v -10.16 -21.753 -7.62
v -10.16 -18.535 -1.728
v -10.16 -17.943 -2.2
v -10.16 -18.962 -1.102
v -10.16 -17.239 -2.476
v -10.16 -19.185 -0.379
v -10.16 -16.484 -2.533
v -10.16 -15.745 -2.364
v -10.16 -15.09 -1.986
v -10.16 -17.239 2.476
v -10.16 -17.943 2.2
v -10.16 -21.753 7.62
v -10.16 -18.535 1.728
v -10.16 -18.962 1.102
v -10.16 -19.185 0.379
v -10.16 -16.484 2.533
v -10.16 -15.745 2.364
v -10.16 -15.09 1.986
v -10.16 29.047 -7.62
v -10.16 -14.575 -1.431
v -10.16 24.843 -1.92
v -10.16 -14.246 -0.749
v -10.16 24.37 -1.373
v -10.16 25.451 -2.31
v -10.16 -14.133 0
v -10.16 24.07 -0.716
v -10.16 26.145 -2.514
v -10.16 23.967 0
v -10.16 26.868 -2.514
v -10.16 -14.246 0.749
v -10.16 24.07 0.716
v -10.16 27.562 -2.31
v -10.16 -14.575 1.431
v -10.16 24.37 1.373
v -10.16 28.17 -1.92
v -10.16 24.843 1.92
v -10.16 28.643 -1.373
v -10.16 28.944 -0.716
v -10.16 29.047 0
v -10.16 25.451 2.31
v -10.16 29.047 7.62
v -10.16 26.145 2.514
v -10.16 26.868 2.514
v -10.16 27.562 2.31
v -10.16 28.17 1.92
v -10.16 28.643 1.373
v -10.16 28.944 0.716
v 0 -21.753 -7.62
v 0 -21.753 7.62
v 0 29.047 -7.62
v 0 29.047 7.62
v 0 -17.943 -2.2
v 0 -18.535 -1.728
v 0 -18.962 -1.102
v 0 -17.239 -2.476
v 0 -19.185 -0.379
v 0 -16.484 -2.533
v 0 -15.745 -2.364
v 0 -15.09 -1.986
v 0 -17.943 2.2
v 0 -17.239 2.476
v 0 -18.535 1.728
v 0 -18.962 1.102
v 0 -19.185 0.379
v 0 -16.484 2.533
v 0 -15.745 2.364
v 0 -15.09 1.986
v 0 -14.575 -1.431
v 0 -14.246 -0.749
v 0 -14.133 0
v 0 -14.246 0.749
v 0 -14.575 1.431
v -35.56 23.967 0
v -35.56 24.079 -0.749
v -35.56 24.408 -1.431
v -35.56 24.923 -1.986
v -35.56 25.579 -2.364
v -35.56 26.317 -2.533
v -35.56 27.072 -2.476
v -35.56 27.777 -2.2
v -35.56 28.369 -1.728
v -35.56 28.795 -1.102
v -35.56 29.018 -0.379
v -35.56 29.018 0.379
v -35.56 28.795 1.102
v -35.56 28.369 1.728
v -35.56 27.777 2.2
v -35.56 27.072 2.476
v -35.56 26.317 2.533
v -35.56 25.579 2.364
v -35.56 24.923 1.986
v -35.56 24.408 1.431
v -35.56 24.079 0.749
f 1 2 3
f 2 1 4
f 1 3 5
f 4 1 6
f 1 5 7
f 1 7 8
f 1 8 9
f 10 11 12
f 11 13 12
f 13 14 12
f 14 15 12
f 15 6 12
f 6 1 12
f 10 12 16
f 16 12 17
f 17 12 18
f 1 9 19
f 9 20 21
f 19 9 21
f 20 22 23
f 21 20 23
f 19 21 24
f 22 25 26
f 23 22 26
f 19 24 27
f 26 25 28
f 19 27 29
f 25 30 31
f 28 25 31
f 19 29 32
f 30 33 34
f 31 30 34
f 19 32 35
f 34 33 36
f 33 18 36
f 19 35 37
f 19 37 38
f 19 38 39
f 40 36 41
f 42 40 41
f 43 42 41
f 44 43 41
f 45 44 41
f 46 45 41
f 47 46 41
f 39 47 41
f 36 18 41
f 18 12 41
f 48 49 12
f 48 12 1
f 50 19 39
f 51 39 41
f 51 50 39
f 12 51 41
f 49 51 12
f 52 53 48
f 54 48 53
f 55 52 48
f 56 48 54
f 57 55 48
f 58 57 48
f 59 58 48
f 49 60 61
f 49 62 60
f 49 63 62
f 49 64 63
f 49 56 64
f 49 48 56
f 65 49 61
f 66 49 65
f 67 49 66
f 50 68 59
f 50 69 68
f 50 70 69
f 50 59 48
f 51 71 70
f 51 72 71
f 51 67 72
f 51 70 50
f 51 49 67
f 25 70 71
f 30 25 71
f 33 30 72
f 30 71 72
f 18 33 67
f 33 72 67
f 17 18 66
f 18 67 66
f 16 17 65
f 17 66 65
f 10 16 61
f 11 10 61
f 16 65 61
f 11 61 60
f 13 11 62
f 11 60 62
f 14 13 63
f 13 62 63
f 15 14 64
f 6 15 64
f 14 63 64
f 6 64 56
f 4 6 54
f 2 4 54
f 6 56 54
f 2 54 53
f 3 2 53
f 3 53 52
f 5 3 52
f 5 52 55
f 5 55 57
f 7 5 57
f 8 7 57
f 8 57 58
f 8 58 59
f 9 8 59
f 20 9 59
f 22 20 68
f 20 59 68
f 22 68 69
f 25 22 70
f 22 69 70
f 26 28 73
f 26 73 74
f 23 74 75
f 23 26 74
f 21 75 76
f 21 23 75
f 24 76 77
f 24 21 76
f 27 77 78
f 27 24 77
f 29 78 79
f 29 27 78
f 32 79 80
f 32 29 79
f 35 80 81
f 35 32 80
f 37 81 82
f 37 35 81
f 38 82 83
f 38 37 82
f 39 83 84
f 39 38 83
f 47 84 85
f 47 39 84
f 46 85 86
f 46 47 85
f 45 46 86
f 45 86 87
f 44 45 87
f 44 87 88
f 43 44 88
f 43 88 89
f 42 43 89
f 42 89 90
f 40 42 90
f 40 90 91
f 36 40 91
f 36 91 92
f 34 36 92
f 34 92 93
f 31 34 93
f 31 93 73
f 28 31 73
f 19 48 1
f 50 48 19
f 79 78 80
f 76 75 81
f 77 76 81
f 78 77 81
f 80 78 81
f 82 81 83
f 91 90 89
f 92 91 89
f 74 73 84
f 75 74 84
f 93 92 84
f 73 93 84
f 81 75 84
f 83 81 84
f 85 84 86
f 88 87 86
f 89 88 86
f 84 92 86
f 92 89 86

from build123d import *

# Parameters (mm, degrees)
F1_DEPTH = 35.56
F0_R     = 2.54
F2_DEPTH = 10.16
F3_DEPTH = 10.16


with BuildPart() as f1:
    # F0 (on Right) → F1 (new body)
    with BuildSketch(Plane.YZ):
        with BuildLine():
            ThreePointArc((29.046643, 0), (26.506643, 2.54), (23.966643, 0))
            ThreePointArc((23.966643, 0), (26.506643, -2.54), (29.046643, 0))
        make_face()
    extrude(amount=-F1_DEPTH)

    # F0 (on Right) → F2 (join)
    with BuildSketch(Plane.YZ):
        Polygon((23.966643, 7.62), (-21.753357, 7.62), (-21.753357, -7.62), (23.966643, -7.62), (23.966643, 0), align=None)
        with Locations((-16.673357, 0)):
            Circle(F0_R, mode=Mode.SUBTRACT)
        with BuildLine():
            ThreePointArc((29.046643, 0), (26.506643, -2.54), (23.966643, 0))
            Line((23.966643, 0), (23.966643, -7.62))
            Line((23.966643, -7.62), (29.046643, -7.62))
            Line((29.046643, -7.62), (29.046643, 0))
        make_face()
    extrude(amount=-F2_DEPTH)

    # F0 (on Right) → F3 (join)
    with BuildSketch(Plane.YZ):
        with BuildLine():
            Line((29.046643, 7.62), (23.966643, 7.62))
            Line((23.966643, 7.62), (23.966643, 0))
            ThreePointArc((23.966643, 0), (26.506643, 2.54), (29.046643, 0))
            Line((29.046643, 0), (29.046643, 7.62))
        make_face()
    extrude(amount=-F3_DEPTH)


solid = f1.part
